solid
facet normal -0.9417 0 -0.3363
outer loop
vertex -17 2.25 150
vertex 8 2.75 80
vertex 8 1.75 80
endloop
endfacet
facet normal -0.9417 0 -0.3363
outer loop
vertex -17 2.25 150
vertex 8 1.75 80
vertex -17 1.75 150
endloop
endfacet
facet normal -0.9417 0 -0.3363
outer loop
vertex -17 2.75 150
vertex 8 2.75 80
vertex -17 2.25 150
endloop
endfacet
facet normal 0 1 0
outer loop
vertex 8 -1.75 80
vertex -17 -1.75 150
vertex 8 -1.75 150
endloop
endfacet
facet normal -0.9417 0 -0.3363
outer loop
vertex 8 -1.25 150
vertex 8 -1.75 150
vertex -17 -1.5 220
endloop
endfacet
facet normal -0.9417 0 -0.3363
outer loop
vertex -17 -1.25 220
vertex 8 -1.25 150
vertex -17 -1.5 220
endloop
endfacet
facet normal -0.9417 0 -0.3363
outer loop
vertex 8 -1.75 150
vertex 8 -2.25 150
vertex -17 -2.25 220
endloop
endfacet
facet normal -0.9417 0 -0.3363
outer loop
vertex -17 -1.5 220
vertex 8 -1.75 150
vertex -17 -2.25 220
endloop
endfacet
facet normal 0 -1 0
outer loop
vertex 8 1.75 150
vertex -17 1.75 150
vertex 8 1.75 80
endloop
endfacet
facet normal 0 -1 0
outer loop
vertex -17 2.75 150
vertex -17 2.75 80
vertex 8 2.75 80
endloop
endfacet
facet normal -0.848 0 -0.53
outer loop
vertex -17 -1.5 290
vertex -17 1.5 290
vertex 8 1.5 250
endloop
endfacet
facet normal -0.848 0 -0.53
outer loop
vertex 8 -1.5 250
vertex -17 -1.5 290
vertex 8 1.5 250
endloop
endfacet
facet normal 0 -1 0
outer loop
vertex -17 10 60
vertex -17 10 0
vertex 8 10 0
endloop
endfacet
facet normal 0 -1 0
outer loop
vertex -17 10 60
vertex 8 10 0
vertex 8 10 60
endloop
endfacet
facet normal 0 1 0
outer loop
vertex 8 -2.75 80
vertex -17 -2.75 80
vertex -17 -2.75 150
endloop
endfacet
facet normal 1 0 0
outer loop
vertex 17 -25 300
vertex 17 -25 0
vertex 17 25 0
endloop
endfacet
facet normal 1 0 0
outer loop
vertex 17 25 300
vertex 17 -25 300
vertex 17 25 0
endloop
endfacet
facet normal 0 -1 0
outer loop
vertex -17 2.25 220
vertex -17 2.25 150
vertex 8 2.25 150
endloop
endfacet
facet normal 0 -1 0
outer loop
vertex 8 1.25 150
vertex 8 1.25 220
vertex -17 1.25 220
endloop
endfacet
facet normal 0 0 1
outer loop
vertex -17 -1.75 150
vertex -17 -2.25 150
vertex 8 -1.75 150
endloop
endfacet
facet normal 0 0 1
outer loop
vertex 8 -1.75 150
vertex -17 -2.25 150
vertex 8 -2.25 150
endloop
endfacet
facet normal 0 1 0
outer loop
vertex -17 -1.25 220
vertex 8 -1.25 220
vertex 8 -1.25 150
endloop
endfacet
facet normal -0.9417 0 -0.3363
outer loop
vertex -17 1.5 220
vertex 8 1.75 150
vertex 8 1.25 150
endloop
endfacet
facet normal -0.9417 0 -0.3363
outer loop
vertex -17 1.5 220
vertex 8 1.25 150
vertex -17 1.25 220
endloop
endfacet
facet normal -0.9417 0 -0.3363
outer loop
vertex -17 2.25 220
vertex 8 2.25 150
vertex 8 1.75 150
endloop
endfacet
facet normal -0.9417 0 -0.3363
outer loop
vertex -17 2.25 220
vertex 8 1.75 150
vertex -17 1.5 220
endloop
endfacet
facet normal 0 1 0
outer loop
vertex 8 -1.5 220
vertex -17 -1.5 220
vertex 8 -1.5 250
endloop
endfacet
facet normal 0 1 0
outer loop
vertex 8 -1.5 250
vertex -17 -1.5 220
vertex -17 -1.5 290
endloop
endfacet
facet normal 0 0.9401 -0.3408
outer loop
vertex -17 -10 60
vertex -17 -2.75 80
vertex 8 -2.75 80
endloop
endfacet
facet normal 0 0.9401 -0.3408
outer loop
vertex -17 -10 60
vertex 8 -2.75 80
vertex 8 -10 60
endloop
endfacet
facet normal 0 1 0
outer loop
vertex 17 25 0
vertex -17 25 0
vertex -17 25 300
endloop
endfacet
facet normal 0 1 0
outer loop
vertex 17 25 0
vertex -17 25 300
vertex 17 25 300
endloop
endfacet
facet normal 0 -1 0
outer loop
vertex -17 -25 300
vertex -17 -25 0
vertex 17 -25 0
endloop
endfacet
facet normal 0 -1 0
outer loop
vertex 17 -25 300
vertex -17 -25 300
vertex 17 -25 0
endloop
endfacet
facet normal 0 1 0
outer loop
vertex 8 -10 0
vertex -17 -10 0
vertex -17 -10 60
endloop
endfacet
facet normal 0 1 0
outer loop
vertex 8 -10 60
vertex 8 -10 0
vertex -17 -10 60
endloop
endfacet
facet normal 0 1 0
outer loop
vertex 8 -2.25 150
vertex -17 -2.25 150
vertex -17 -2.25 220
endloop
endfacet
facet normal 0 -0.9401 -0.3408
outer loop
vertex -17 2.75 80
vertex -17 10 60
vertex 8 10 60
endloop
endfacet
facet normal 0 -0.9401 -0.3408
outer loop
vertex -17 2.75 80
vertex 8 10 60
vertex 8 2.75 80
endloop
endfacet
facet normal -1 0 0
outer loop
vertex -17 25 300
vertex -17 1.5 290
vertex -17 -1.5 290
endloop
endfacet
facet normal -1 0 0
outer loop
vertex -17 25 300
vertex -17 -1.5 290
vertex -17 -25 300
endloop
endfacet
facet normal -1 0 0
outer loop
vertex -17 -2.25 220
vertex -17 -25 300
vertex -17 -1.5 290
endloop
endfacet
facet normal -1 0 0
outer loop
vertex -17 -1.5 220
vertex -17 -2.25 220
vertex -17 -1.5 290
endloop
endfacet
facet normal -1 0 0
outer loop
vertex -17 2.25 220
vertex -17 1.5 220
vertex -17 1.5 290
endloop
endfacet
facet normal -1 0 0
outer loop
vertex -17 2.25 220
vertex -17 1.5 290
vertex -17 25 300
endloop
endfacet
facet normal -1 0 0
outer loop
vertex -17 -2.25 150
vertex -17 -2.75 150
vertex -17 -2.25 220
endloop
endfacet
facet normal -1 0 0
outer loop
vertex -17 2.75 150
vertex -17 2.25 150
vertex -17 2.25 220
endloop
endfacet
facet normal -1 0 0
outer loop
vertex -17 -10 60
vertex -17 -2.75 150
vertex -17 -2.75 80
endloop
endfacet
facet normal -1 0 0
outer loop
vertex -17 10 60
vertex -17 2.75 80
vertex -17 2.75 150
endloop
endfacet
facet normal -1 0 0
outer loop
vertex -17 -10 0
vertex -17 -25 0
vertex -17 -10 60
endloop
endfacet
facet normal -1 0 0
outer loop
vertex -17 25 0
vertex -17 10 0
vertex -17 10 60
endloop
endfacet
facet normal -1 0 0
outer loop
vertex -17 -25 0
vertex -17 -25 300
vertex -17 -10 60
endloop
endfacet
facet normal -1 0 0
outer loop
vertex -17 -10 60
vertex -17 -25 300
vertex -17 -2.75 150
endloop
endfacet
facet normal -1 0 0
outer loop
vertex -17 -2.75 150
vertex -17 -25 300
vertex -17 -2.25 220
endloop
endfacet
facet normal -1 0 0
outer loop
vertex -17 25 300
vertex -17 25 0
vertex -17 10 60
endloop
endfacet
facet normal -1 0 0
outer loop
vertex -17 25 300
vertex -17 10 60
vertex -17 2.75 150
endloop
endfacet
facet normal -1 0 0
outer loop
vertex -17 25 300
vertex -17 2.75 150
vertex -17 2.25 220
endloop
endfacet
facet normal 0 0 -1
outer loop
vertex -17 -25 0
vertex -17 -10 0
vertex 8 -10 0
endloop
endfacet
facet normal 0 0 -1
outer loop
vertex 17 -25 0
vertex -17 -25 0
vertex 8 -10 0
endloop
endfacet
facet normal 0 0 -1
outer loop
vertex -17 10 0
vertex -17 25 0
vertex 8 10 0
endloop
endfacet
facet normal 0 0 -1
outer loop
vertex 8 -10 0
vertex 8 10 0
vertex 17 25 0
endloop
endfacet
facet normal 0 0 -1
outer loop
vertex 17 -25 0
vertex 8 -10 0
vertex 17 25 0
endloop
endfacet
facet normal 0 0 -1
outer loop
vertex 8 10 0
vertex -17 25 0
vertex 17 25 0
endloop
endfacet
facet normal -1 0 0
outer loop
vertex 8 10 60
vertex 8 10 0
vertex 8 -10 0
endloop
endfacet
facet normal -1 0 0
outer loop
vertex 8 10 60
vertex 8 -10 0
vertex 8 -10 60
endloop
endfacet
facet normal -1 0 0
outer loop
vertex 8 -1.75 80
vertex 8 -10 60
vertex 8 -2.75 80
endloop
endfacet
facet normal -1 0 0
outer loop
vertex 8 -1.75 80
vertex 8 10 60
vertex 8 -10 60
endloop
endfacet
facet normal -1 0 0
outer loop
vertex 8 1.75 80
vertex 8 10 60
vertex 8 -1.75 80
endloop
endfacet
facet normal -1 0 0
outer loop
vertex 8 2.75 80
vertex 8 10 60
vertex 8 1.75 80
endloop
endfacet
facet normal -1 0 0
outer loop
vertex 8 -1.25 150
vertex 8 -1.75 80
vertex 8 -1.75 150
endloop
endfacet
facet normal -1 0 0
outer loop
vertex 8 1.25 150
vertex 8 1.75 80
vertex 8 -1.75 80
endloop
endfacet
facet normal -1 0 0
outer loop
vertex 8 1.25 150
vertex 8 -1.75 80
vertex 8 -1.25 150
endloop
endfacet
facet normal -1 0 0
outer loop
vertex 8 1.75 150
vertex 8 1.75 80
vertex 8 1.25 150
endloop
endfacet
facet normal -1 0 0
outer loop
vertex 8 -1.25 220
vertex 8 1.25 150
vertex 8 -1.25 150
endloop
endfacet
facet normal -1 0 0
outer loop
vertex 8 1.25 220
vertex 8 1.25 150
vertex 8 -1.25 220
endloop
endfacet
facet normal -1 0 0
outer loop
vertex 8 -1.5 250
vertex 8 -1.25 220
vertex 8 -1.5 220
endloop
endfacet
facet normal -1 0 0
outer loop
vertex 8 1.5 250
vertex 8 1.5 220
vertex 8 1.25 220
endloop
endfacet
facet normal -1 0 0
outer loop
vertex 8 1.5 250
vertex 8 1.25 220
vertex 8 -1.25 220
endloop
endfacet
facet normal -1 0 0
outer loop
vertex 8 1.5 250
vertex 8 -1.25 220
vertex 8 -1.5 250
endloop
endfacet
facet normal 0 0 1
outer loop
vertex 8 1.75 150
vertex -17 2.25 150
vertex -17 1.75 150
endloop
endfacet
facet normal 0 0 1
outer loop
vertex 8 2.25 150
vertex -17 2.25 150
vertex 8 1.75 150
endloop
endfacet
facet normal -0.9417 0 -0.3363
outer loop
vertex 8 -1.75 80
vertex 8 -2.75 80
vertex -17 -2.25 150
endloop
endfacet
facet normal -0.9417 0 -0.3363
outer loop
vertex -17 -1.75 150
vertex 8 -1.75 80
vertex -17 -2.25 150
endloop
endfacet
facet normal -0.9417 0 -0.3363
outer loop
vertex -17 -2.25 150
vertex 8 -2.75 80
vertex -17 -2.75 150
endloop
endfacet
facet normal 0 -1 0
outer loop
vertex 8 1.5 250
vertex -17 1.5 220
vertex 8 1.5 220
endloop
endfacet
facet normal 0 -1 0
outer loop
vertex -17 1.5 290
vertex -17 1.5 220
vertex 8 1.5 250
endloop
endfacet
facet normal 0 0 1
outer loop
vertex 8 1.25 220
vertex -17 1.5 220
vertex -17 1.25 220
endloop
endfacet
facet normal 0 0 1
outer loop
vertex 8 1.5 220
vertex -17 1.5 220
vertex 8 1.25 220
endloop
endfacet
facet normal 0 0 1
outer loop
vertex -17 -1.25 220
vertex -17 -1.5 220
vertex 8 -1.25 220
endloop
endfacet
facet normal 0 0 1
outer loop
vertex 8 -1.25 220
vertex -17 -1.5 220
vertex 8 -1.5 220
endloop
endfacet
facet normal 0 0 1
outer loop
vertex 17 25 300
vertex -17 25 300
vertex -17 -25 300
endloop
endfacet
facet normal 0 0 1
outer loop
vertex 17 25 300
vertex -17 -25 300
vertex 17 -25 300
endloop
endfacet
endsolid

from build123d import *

# Parameters (mm, degrees)
SKETCH1_W           = 34
SKETCH1_H           = 50
BOSS_EXTRUDE1_DEPTH = 300
SKETCH3_W           = 70
SKETCH3_H           = 3
CUT_EXTRUDE1_DEPTH  = 25
SKETCH4_W           = 70
SKETCH4_H           = 4.5
CUT_EXTRUDE2_DEPTH  = 25
SKETCH5_W           = 70
SKETCH5_H           = 5.5
CUT_EXTRUDE3_DEPTH  = 25
SKETCH6_W           = 60
SKETCH6_H           = 20
CUT_EXTRUDE4_DEPTH  = 25
BOSS_EXTRUDE2_DEPTH = 1
BOSS_EXTRUDE3_DEPTH = 1
BOSS_EXTRUDE4_DEPTH = 3


with BuildPart() as part:
    # Sketch1 → Boss-Extrude1 (new body)
    with BuildSketch(Plane.XY):
        Rectangle(SKETCH1_W, SKETCH1_H)
    extrude(amount=BOSS_EXTRUDE1_DEPTH)

    # Sketch3 → Cut-Extrude1 (cut)
    with BuildSketch(Plane.ZY.offset(17)):
        with Locations((255, 0)):
            Rectangle(SKETCH3_W, SKETCH3_H)
    extrude(amount=-CUT_EXTRUDE1_DEPTH, mode=Mode.SUBTRACT)

    # Sketch4 → Cut-Extrude2 (cut)
    with BuildSketch(Plane.ZY.offset(17)):
        with Locations((185, 0)):
            Rectangle(SKETCH4_W, SKETCH4_H)
    extrude(amount=-CUT_EXTRUDE2_DEPTH, mode=Mode.SUBTRACT)

    # Sketch5 → Cut-Extrude3 (cut)
    with BuildSketch(Plane.ZY.offset(17)):
        with Locations((115, 0)):
            Rectangle(SKETCH5_W, SKETCH5_H)
    extrude(amount=-CUT_EXTRUDE3_DEPTH, mode=Mode.SUBTRACT)

    # Sketch6 → Cut-Extrude4 (cut)
    with BuildSketch(Plane.ZY.offset(17)):
        with Locations((30, 0)):
            Rectangle(SKETCH6_W, SKETCH6_H)
        Polygon((60, 10), (80, 2.75), (80, -2.75), (60, -10), align=None)
    extrude(amount=-CUT_EXTRUDE4_DEPTH, mode=Mode.SUBTRACT)

    # Sketch7 → Boss-Extrude2 (add)
    with BuildSketch(Plane(origin=(0, 2.75, 0), x_dir=(-1, 0, 0), z_dir=(0, -1, 0))):
        Polygon((-8, -80), (17, -150), (-8, -150), align=None)
    boss_extrude2 = extrude(amount=BOSS_EXTRUDE2_DEPTH)

    # Sketch9 → Boss-Extrude3 (add)
    with BuildSketch(Plane.XZ.offset(-2.25)):
        Polygon((-17, 220), (8, 220), (8, 150), align=None)
    boss_extrude3 = extrude(amount=BOSS_EXTRUDE3_DEPTH)

    # Sketch10 → Boss-Extrude4 (add)
    with BuildSketch(Plane(origin=(0, 1.5, 0), x_dir=(-1, 0, 0), z_dir=(0, -1, 0))):
        Polygon((17, -290), (-8, -250), (-8, -290), align=None)
    extrude(amount=BOSS_EXTRUDE4_DEPTH)

    # Mirror3: Boss-Extrude2, Boss-Extrude3 across plane
    add(boss_extrude2.mirror(Plane.ZX))
    add(boss_extrude3.mirror(Plane.ZX))


solid = part.part
